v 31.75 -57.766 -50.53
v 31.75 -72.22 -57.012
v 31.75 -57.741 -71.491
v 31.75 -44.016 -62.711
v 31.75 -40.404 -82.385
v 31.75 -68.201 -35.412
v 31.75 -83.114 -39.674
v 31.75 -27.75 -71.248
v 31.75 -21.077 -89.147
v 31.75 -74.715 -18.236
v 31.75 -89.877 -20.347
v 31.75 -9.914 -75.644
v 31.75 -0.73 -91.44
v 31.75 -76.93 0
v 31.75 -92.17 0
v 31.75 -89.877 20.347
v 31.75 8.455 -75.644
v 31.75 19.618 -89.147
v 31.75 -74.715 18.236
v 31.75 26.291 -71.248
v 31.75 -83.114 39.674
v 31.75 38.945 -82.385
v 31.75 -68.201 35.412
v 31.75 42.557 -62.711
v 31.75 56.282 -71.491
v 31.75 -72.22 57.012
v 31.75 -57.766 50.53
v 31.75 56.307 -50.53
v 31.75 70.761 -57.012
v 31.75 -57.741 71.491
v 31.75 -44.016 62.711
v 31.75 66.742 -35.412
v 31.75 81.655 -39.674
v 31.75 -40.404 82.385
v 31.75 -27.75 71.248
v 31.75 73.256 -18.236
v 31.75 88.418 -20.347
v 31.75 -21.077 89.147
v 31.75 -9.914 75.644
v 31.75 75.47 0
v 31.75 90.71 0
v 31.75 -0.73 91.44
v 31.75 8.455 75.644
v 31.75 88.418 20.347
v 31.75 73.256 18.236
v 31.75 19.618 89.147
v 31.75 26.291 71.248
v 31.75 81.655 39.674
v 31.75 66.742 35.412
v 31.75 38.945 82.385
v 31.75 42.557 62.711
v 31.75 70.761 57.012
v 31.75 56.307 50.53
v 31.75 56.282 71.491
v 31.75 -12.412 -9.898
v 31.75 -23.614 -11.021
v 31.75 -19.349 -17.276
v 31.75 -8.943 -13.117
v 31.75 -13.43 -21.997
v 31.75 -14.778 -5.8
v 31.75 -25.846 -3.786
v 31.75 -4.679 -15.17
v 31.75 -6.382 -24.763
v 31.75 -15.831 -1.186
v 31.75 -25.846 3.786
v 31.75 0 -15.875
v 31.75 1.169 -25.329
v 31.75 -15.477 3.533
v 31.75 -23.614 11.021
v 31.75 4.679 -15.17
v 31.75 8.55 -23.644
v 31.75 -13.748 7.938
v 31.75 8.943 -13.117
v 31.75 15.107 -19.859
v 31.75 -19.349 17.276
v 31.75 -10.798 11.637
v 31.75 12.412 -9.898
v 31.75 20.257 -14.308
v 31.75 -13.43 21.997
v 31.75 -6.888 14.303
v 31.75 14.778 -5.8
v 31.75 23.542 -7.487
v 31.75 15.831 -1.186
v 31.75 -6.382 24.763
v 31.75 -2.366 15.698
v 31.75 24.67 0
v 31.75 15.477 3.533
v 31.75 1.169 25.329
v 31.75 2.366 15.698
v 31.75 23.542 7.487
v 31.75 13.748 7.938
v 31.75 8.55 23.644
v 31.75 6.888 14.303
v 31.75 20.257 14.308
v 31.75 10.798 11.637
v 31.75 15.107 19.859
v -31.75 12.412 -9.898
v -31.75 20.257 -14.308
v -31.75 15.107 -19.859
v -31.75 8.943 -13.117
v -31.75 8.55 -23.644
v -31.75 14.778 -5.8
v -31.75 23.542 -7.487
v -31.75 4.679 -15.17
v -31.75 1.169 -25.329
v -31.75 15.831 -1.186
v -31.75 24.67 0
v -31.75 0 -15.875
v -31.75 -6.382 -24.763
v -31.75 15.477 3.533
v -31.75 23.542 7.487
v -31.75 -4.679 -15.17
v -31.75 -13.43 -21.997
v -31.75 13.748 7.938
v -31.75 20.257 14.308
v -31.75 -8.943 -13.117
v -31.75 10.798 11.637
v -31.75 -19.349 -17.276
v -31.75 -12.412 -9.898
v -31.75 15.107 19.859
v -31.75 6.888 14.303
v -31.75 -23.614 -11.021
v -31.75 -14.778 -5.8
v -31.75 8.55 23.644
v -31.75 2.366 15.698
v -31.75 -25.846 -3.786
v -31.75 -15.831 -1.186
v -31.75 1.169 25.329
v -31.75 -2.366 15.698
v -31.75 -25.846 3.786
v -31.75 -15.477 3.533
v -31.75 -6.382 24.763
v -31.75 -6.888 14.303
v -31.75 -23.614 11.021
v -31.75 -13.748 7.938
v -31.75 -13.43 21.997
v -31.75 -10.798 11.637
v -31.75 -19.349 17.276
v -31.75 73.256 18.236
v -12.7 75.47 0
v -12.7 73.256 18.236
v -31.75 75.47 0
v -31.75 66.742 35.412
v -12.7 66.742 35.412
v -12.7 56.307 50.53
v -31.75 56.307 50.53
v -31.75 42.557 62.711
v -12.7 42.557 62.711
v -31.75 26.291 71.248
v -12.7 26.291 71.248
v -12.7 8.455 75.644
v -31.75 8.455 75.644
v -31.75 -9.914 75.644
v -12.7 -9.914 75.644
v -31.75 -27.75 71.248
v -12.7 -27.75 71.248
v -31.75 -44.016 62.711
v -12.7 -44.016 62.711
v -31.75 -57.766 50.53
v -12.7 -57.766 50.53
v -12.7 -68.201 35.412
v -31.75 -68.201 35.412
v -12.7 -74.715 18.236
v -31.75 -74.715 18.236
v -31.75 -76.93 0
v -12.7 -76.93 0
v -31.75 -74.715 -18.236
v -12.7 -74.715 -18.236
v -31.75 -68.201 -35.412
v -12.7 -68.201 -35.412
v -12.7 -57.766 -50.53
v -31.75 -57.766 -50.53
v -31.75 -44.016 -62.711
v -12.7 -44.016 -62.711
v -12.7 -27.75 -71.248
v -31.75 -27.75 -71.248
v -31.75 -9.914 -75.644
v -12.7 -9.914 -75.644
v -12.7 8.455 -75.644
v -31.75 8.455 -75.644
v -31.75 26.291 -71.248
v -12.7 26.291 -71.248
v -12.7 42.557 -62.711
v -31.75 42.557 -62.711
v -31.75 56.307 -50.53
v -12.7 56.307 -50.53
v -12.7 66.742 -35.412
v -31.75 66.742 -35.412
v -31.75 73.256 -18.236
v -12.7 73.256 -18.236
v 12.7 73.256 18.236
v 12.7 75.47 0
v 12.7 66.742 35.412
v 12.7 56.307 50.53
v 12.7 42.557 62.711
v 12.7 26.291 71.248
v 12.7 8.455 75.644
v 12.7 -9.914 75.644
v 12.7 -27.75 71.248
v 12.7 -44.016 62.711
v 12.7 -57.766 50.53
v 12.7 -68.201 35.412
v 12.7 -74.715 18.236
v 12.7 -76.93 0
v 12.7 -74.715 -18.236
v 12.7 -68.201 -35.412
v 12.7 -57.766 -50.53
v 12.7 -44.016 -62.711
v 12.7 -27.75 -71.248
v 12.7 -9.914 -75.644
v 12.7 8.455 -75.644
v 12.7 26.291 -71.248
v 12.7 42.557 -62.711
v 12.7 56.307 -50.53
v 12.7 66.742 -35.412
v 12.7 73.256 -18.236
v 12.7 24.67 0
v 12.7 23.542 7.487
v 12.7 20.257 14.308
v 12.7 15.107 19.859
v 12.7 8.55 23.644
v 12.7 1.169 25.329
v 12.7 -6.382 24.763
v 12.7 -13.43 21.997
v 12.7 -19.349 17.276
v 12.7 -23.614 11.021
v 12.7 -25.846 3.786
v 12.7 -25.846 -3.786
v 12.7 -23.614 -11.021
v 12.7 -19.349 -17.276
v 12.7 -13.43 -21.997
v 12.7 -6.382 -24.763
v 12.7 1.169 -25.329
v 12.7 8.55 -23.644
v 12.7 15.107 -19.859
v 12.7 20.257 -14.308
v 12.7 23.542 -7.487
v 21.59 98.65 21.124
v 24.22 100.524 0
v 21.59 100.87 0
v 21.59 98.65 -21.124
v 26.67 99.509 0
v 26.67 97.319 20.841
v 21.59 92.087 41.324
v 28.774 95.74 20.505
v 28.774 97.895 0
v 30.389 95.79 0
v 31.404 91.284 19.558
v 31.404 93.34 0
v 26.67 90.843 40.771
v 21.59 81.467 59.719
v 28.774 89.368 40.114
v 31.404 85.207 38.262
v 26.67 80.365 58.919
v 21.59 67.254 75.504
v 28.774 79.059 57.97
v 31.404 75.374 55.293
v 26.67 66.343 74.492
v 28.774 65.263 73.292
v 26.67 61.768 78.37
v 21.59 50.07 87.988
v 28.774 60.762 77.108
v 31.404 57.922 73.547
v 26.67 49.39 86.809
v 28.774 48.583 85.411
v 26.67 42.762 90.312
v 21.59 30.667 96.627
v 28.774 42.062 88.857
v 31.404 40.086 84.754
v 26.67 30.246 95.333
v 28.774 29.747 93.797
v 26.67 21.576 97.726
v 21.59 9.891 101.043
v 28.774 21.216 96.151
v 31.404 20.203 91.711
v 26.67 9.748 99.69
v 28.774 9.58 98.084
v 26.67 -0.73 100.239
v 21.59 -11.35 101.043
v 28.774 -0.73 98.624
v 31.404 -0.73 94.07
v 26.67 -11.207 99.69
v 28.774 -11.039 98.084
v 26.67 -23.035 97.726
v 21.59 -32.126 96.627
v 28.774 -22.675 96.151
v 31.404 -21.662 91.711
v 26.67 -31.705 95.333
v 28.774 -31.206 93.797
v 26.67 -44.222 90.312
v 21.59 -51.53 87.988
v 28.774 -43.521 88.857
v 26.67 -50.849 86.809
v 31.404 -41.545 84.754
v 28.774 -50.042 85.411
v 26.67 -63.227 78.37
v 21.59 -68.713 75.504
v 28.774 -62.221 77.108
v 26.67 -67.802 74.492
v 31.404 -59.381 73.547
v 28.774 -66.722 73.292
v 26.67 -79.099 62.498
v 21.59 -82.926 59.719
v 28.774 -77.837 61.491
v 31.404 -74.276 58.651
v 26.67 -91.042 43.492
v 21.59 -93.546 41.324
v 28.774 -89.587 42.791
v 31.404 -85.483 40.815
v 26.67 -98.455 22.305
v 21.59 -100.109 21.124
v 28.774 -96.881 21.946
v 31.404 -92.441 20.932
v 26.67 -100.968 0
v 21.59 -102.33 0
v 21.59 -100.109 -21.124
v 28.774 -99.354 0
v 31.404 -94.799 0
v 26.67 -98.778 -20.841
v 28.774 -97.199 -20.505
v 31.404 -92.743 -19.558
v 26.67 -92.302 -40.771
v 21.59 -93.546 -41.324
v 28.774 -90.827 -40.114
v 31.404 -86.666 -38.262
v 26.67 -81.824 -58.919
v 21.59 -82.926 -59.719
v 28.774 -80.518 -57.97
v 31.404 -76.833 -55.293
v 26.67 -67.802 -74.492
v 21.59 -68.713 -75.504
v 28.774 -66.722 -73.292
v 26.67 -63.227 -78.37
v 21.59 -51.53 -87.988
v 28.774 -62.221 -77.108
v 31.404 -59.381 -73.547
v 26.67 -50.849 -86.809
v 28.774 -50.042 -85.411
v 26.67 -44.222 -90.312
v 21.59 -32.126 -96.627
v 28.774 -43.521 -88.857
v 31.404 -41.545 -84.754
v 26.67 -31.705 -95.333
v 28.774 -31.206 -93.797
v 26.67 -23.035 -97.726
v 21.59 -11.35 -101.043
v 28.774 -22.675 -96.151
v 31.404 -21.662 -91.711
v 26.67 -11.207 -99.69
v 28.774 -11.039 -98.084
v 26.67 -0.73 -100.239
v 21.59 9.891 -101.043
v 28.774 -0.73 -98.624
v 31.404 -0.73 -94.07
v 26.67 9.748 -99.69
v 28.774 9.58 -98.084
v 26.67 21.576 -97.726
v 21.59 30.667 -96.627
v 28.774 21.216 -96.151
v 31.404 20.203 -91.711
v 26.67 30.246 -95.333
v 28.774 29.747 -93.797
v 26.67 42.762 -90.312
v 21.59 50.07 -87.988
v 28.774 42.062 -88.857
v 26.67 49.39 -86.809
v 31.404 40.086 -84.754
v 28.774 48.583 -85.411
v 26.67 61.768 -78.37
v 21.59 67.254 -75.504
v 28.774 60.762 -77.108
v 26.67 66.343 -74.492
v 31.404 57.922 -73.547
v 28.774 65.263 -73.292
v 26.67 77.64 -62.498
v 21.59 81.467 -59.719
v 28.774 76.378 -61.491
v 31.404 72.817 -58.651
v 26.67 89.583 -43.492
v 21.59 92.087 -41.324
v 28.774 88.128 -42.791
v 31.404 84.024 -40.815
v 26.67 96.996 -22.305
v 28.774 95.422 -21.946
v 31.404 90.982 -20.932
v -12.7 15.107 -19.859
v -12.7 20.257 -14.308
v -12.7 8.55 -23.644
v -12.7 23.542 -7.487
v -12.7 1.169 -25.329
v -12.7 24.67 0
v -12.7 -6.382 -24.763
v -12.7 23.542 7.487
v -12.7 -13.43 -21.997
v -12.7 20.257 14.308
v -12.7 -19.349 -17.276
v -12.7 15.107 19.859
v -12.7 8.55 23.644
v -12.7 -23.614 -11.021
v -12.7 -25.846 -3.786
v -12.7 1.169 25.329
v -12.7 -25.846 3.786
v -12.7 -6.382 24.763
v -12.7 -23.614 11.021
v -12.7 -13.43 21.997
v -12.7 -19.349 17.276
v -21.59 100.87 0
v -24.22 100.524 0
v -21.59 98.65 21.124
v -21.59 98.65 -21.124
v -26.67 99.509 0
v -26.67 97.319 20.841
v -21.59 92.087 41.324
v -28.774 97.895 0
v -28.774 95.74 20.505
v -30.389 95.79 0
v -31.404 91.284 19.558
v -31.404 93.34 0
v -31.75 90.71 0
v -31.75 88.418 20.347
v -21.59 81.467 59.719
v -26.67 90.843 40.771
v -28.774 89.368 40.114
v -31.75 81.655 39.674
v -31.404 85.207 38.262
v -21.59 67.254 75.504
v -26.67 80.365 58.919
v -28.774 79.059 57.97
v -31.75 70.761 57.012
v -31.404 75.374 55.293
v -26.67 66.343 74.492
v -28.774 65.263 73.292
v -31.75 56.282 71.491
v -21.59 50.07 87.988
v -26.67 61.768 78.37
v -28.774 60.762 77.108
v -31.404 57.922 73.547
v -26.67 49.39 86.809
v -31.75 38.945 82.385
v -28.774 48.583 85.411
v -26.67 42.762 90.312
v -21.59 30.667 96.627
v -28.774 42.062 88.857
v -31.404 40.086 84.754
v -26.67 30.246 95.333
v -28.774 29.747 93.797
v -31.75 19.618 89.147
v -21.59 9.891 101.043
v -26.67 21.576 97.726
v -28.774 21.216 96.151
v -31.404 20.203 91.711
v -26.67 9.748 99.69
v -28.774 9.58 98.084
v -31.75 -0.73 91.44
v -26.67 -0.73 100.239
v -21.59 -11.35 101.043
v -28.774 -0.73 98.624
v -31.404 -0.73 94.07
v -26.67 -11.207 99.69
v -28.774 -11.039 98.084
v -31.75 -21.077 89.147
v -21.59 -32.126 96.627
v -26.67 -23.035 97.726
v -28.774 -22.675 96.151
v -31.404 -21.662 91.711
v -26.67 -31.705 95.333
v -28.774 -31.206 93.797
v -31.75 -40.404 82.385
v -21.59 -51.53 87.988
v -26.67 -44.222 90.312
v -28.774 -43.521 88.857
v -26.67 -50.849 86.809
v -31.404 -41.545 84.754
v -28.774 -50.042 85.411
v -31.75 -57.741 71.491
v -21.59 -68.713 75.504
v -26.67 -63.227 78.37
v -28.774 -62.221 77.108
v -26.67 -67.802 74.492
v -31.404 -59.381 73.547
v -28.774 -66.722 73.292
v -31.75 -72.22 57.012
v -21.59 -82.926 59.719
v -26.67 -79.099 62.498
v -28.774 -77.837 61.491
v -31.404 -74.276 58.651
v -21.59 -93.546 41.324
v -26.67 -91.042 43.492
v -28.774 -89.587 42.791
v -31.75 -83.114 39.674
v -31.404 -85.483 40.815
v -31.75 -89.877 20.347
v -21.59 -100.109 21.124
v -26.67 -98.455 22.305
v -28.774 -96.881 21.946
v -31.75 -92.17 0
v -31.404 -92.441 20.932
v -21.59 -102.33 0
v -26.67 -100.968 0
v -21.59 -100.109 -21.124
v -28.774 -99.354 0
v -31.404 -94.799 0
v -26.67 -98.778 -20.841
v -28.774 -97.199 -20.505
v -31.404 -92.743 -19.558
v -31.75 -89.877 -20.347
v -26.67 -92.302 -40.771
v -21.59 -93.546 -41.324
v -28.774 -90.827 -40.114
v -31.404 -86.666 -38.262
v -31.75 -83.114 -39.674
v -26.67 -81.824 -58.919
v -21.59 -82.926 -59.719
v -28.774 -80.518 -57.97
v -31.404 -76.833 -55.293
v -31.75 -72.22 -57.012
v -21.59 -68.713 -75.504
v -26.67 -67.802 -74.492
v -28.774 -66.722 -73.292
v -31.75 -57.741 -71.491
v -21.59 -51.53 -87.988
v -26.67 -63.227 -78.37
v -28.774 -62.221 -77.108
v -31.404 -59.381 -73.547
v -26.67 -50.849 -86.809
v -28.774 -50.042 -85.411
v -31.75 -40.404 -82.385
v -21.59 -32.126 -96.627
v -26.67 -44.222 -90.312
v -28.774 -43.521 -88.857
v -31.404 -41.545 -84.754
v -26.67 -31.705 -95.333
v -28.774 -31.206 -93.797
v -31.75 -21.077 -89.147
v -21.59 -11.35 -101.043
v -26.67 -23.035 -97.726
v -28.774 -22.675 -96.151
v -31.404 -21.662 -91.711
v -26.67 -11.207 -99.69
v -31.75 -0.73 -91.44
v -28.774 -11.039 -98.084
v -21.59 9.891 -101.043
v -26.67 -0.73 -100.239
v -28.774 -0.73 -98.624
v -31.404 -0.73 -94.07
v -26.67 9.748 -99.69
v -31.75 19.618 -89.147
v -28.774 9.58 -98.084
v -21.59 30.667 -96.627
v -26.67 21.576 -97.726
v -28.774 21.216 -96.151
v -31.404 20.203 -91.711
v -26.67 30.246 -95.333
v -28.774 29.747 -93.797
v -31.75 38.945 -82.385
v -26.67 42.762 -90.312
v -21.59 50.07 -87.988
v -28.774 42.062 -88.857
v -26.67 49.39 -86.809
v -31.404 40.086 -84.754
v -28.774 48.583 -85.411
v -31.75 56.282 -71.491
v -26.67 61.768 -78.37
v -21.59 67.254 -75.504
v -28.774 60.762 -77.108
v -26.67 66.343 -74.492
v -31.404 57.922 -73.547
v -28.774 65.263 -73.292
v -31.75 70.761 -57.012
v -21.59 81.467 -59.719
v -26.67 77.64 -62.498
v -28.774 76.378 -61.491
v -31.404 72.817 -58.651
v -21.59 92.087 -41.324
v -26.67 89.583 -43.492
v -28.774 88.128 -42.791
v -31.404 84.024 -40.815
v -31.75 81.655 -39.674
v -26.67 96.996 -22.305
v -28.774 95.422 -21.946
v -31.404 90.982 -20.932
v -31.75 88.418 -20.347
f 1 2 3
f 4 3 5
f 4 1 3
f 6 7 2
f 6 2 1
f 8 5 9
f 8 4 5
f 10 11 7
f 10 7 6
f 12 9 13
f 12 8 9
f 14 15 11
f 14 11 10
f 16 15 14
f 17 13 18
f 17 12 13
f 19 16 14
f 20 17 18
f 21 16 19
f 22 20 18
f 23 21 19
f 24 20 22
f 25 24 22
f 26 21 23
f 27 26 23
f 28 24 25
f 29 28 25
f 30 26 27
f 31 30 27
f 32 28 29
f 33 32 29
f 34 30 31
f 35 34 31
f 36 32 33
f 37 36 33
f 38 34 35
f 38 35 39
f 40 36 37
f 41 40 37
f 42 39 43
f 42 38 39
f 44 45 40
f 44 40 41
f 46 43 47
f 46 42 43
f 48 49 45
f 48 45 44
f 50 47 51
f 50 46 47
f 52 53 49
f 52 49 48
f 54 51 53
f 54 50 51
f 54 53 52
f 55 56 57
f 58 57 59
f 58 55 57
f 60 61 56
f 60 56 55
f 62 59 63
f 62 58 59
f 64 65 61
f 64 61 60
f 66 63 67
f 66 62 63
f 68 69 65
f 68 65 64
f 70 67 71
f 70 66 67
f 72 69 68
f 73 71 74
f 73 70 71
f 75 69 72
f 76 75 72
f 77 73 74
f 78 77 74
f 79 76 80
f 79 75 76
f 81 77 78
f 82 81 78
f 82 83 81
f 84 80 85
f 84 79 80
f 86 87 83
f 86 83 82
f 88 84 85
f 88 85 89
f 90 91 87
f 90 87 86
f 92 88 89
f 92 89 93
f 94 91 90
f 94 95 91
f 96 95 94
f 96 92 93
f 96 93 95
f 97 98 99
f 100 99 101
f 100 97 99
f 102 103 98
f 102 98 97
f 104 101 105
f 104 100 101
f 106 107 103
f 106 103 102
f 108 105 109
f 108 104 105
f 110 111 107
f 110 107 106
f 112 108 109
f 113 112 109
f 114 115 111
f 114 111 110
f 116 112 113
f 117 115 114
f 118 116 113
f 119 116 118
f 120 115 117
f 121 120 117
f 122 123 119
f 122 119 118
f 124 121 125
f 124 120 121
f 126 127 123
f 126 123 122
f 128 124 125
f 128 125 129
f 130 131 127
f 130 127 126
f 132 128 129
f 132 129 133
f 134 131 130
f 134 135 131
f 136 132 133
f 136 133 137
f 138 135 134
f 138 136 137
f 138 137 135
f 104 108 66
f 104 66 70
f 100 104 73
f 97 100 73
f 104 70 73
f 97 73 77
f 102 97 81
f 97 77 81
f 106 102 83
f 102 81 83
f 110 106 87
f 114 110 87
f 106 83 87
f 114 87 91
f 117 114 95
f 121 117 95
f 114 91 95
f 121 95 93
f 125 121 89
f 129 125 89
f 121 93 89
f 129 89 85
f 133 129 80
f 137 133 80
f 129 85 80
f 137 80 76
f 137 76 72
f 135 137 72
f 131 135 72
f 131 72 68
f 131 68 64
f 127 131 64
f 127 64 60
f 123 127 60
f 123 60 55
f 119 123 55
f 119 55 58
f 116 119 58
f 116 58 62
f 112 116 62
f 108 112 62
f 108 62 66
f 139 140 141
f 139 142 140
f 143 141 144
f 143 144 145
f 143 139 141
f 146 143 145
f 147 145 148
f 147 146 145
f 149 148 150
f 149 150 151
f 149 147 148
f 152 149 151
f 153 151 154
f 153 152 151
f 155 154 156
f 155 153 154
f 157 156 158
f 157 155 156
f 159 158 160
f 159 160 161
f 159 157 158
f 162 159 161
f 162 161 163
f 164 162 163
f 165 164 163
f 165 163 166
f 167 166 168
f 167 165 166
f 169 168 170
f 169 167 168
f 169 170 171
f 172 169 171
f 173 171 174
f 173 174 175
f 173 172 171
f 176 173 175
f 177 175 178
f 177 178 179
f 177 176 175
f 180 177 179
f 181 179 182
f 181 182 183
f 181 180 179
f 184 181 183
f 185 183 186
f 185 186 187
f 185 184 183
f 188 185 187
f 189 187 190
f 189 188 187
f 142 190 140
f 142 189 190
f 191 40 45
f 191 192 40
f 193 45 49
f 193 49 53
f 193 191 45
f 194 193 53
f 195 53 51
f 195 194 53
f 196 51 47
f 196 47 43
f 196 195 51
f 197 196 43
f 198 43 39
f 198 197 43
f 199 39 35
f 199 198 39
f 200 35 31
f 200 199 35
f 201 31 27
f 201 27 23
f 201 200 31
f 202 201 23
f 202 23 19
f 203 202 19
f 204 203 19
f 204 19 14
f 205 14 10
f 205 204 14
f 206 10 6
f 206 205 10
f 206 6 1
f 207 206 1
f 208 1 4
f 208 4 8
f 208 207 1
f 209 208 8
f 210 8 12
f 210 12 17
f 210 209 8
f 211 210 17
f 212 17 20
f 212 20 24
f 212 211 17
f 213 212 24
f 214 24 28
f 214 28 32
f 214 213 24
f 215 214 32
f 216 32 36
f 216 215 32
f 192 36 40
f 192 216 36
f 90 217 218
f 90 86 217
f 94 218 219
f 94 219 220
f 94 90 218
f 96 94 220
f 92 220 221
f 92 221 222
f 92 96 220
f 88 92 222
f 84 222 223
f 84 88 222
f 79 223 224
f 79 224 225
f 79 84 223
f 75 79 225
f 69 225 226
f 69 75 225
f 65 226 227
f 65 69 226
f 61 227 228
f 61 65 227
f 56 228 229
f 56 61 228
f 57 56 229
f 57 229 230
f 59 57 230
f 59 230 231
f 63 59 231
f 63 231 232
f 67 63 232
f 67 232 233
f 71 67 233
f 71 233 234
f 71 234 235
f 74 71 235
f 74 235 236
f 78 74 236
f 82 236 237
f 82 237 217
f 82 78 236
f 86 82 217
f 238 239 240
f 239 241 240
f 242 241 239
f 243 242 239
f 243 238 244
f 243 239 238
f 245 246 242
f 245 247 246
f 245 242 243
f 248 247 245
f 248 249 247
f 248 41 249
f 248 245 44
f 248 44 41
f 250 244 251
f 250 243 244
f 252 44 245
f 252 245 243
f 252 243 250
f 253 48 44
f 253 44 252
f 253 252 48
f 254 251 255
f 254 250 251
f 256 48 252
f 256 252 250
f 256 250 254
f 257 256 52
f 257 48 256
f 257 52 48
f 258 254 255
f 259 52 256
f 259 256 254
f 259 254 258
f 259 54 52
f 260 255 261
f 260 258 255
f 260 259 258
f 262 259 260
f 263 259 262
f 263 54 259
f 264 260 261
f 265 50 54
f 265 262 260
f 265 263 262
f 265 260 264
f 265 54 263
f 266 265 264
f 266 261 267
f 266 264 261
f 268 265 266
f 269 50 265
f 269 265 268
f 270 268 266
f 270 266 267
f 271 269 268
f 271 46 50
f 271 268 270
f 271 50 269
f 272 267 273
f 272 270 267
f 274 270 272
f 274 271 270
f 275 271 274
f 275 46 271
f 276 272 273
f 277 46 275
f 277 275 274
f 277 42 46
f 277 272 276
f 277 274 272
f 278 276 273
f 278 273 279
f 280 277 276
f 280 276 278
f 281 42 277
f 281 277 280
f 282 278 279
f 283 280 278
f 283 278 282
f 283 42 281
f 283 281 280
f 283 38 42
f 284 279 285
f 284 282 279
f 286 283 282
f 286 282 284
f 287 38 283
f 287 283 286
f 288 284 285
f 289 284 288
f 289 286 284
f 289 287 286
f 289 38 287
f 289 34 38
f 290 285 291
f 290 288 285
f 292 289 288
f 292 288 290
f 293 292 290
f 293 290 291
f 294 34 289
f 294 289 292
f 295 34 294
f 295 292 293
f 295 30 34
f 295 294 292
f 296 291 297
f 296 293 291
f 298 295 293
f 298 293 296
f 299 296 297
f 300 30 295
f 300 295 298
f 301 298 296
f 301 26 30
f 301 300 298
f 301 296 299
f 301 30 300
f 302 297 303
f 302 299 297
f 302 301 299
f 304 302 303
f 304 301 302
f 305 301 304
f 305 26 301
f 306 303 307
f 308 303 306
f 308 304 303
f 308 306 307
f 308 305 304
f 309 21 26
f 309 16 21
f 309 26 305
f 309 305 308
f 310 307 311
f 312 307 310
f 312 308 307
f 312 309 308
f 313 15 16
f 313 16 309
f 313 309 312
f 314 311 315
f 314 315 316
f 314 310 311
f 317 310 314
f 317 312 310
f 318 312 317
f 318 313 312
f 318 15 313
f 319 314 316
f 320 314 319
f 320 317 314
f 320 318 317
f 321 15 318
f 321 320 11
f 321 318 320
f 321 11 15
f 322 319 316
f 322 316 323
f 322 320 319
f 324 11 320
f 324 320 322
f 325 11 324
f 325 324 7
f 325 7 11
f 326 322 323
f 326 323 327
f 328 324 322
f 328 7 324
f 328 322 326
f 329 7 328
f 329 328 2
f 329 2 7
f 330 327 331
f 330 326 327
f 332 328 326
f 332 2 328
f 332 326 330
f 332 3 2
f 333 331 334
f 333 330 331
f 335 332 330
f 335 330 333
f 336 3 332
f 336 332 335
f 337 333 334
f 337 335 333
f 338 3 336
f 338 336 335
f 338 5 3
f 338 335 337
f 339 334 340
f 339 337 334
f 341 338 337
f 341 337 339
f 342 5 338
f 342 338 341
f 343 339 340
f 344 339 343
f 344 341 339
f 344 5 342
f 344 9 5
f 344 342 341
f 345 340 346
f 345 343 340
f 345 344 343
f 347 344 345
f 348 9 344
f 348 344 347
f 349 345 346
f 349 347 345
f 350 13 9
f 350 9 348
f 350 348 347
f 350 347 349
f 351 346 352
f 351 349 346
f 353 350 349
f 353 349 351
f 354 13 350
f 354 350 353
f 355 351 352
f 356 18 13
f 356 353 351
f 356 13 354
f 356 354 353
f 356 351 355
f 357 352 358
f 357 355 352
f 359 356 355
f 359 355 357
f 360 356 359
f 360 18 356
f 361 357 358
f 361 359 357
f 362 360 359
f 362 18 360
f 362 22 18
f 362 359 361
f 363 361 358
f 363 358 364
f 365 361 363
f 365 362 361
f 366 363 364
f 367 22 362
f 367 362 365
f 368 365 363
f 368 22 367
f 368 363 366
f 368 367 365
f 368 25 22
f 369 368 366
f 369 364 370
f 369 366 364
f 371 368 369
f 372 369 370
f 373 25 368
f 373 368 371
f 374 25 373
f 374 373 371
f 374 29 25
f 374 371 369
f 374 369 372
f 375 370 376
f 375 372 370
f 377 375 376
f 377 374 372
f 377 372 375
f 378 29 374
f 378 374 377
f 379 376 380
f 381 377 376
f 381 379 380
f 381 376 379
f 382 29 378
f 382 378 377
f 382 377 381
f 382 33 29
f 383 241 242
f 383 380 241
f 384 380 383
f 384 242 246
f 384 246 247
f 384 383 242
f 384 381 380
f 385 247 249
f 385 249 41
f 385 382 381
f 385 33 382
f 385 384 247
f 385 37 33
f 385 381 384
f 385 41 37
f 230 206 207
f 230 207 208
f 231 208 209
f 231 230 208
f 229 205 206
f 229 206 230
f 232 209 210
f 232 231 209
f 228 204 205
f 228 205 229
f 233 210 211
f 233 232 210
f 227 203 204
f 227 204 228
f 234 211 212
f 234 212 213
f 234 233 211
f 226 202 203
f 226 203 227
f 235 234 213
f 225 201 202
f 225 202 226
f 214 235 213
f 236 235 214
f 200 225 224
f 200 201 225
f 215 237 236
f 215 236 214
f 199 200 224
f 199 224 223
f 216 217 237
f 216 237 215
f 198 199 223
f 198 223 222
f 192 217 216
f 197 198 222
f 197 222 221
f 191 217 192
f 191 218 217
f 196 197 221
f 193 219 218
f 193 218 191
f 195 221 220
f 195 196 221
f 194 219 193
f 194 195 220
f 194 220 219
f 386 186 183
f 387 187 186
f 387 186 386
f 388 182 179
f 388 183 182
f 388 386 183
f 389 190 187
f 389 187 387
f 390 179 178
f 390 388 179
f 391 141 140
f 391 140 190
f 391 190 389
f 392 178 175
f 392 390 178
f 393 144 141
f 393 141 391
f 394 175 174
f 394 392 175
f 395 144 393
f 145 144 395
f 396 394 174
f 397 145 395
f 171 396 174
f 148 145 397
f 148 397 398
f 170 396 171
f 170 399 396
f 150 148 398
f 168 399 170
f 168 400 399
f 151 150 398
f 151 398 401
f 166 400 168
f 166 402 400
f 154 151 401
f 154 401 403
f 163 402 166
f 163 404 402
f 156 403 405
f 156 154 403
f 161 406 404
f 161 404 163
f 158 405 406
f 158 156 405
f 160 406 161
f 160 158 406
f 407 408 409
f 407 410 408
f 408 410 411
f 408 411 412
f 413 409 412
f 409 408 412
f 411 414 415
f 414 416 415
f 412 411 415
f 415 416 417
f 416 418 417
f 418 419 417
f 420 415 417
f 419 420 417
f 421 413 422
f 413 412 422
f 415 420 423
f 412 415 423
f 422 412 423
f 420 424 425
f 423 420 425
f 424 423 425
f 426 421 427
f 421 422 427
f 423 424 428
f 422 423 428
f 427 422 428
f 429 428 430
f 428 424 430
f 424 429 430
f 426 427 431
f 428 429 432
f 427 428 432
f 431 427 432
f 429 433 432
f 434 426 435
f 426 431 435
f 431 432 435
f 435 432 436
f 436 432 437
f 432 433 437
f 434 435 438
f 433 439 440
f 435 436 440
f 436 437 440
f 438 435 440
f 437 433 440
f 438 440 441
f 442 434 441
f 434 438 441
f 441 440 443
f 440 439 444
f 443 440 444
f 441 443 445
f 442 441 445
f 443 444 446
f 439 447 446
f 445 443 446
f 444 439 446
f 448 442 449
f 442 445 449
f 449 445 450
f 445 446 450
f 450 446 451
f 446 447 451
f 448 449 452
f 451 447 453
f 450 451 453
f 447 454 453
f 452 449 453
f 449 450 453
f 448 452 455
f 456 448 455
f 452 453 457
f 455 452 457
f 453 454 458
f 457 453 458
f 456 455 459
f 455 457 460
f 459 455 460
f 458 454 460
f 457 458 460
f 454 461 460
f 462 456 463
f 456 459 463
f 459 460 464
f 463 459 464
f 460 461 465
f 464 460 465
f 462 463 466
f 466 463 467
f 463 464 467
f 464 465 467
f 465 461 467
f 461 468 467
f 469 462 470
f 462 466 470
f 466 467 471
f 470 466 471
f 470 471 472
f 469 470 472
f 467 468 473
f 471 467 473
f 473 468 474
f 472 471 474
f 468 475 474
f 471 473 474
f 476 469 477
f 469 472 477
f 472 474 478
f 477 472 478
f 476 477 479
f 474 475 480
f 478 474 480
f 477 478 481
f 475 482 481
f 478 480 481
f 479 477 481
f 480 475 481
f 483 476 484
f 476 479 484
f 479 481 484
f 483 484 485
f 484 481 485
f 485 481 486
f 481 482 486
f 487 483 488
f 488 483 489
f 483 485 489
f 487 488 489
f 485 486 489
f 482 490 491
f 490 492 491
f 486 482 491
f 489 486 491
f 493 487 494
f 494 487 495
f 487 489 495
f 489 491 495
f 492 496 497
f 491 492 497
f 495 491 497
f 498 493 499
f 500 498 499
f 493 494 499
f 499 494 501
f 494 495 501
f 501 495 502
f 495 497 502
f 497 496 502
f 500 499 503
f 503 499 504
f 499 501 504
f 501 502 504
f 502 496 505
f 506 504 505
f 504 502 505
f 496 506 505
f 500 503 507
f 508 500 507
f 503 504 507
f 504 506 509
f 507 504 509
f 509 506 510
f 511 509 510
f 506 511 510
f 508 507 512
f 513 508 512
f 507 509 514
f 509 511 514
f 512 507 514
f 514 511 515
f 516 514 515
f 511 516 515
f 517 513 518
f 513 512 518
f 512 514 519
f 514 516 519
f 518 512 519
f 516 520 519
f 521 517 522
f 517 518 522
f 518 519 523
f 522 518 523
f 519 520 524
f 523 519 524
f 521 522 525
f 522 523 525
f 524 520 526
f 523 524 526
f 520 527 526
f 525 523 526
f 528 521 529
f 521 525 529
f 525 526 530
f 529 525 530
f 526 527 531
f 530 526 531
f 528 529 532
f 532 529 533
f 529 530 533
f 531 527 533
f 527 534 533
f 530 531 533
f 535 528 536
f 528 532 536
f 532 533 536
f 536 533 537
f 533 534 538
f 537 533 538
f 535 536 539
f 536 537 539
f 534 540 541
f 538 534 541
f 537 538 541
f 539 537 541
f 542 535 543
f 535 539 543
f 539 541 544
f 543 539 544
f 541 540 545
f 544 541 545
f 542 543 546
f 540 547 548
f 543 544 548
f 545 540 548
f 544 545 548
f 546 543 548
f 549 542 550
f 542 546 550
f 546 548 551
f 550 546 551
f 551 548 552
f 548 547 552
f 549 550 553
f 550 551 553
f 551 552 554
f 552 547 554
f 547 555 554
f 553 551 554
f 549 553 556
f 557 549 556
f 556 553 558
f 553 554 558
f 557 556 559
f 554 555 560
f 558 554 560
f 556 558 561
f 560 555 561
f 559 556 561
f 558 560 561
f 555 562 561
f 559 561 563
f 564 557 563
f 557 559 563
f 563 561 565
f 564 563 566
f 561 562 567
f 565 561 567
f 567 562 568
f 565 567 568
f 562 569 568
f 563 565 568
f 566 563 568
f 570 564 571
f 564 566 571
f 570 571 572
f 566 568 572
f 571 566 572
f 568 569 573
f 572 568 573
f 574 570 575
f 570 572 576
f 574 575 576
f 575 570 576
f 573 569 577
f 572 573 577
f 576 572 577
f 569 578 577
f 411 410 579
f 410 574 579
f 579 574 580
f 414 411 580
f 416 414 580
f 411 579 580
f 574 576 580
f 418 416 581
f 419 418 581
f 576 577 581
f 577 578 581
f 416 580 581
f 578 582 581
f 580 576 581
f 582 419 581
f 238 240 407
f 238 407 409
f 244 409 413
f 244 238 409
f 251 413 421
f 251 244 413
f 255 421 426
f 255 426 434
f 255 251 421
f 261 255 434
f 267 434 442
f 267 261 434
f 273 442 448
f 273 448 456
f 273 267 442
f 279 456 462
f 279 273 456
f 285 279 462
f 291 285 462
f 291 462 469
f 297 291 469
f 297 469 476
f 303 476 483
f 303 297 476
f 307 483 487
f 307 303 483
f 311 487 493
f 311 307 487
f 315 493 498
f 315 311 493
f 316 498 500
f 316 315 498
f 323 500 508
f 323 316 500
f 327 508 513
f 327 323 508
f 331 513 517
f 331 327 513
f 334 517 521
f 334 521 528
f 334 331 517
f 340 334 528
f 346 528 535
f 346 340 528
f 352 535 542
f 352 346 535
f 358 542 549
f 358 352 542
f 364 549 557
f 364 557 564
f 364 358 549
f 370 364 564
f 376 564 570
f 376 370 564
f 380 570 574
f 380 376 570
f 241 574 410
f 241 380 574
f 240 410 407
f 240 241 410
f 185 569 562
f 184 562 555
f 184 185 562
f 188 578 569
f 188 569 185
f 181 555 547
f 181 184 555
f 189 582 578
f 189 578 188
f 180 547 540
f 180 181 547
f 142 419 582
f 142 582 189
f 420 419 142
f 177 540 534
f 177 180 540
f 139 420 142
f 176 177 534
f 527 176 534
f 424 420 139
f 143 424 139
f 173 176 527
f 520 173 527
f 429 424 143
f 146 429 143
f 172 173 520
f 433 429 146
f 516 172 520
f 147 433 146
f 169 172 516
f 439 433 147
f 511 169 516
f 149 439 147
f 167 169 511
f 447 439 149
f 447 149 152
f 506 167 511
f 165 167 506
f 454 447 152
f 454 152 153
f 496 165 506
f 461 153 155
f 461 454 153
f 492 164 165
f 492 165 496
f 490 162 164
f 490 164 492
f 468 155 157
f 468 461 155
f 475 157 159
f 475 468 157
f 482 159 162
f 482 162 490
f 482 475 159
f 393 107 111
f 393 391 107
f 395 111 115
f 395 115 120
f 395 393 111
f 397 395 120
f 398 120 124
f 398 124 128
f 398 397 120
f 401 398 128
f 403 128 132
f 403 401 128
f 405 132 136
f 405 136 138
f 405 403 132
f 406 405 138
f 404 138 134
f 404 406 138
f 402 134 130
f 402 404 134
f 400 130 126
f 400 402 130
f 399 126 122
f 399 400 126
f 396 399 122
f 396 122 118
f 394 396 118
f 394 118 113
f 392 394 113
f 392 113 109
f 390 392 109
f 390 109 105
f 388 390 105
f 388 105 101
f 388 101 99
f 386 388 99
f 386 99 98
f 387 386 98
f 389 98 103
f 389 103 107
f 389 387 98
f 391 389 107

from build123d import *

# Parameters (mm, degrees)
SKETCH2_R          = 15.875
CUT_EXTRUDE1_DEPTH = 64.5
FILLET2_R          = 10.16
FILLET3_R          = 10.16


with BuildPart() as part:
    # Sketch1 → Revolve2 (revolve)
    with BuildSketch(Plane.XY):
        Polygon((-31.75, -0.729526652), (-31.75, 24.670473348), (-12.7, 24.670473348), (-12.7, 75.470473348), (-31.75, 75.470473348), (-31.75, 100.870473348), (31.75, 100.870473348), (31.75, 75.470473348), (12.7, 75.470473348), (12.7, 24.670473348), (31.75, 24.670473348), (31.75, -0.729526652), align=None)
    revolve(axis=Axis((-31.75, -0.729526652, 0), (1, 0, 0)))

    # Sketch2 → Cut-Extrude1 (cut, through all)
    with BuildSketch(Plane(origin=(31.75, 0, 0), x_dir=(0, 0, -1), z_dir=(1, 0, 0))):
        Circle(SKETCH2_R)
    extrude(amount=-CUT_EXTRUDE1_DEPTH, mode=Mode.SUBTRACT)

    # Fillet2
    fillet2_edges = [part.edges().sort_by_distance(p)[0] for p in [
        (31.75, -102.329526652, 0),
    ]]
    fillet(fillet2_edges, radius=FILLET2_R)

    # Fillet3
    fillet3_edges = [part.edges().sort_by_distance(p)[0] for p in [
        (-31.75, -102.329526652, 0),
    ]]
    fillet(fillet3_edges, radius=FILLET3_R)


solid = part.part
